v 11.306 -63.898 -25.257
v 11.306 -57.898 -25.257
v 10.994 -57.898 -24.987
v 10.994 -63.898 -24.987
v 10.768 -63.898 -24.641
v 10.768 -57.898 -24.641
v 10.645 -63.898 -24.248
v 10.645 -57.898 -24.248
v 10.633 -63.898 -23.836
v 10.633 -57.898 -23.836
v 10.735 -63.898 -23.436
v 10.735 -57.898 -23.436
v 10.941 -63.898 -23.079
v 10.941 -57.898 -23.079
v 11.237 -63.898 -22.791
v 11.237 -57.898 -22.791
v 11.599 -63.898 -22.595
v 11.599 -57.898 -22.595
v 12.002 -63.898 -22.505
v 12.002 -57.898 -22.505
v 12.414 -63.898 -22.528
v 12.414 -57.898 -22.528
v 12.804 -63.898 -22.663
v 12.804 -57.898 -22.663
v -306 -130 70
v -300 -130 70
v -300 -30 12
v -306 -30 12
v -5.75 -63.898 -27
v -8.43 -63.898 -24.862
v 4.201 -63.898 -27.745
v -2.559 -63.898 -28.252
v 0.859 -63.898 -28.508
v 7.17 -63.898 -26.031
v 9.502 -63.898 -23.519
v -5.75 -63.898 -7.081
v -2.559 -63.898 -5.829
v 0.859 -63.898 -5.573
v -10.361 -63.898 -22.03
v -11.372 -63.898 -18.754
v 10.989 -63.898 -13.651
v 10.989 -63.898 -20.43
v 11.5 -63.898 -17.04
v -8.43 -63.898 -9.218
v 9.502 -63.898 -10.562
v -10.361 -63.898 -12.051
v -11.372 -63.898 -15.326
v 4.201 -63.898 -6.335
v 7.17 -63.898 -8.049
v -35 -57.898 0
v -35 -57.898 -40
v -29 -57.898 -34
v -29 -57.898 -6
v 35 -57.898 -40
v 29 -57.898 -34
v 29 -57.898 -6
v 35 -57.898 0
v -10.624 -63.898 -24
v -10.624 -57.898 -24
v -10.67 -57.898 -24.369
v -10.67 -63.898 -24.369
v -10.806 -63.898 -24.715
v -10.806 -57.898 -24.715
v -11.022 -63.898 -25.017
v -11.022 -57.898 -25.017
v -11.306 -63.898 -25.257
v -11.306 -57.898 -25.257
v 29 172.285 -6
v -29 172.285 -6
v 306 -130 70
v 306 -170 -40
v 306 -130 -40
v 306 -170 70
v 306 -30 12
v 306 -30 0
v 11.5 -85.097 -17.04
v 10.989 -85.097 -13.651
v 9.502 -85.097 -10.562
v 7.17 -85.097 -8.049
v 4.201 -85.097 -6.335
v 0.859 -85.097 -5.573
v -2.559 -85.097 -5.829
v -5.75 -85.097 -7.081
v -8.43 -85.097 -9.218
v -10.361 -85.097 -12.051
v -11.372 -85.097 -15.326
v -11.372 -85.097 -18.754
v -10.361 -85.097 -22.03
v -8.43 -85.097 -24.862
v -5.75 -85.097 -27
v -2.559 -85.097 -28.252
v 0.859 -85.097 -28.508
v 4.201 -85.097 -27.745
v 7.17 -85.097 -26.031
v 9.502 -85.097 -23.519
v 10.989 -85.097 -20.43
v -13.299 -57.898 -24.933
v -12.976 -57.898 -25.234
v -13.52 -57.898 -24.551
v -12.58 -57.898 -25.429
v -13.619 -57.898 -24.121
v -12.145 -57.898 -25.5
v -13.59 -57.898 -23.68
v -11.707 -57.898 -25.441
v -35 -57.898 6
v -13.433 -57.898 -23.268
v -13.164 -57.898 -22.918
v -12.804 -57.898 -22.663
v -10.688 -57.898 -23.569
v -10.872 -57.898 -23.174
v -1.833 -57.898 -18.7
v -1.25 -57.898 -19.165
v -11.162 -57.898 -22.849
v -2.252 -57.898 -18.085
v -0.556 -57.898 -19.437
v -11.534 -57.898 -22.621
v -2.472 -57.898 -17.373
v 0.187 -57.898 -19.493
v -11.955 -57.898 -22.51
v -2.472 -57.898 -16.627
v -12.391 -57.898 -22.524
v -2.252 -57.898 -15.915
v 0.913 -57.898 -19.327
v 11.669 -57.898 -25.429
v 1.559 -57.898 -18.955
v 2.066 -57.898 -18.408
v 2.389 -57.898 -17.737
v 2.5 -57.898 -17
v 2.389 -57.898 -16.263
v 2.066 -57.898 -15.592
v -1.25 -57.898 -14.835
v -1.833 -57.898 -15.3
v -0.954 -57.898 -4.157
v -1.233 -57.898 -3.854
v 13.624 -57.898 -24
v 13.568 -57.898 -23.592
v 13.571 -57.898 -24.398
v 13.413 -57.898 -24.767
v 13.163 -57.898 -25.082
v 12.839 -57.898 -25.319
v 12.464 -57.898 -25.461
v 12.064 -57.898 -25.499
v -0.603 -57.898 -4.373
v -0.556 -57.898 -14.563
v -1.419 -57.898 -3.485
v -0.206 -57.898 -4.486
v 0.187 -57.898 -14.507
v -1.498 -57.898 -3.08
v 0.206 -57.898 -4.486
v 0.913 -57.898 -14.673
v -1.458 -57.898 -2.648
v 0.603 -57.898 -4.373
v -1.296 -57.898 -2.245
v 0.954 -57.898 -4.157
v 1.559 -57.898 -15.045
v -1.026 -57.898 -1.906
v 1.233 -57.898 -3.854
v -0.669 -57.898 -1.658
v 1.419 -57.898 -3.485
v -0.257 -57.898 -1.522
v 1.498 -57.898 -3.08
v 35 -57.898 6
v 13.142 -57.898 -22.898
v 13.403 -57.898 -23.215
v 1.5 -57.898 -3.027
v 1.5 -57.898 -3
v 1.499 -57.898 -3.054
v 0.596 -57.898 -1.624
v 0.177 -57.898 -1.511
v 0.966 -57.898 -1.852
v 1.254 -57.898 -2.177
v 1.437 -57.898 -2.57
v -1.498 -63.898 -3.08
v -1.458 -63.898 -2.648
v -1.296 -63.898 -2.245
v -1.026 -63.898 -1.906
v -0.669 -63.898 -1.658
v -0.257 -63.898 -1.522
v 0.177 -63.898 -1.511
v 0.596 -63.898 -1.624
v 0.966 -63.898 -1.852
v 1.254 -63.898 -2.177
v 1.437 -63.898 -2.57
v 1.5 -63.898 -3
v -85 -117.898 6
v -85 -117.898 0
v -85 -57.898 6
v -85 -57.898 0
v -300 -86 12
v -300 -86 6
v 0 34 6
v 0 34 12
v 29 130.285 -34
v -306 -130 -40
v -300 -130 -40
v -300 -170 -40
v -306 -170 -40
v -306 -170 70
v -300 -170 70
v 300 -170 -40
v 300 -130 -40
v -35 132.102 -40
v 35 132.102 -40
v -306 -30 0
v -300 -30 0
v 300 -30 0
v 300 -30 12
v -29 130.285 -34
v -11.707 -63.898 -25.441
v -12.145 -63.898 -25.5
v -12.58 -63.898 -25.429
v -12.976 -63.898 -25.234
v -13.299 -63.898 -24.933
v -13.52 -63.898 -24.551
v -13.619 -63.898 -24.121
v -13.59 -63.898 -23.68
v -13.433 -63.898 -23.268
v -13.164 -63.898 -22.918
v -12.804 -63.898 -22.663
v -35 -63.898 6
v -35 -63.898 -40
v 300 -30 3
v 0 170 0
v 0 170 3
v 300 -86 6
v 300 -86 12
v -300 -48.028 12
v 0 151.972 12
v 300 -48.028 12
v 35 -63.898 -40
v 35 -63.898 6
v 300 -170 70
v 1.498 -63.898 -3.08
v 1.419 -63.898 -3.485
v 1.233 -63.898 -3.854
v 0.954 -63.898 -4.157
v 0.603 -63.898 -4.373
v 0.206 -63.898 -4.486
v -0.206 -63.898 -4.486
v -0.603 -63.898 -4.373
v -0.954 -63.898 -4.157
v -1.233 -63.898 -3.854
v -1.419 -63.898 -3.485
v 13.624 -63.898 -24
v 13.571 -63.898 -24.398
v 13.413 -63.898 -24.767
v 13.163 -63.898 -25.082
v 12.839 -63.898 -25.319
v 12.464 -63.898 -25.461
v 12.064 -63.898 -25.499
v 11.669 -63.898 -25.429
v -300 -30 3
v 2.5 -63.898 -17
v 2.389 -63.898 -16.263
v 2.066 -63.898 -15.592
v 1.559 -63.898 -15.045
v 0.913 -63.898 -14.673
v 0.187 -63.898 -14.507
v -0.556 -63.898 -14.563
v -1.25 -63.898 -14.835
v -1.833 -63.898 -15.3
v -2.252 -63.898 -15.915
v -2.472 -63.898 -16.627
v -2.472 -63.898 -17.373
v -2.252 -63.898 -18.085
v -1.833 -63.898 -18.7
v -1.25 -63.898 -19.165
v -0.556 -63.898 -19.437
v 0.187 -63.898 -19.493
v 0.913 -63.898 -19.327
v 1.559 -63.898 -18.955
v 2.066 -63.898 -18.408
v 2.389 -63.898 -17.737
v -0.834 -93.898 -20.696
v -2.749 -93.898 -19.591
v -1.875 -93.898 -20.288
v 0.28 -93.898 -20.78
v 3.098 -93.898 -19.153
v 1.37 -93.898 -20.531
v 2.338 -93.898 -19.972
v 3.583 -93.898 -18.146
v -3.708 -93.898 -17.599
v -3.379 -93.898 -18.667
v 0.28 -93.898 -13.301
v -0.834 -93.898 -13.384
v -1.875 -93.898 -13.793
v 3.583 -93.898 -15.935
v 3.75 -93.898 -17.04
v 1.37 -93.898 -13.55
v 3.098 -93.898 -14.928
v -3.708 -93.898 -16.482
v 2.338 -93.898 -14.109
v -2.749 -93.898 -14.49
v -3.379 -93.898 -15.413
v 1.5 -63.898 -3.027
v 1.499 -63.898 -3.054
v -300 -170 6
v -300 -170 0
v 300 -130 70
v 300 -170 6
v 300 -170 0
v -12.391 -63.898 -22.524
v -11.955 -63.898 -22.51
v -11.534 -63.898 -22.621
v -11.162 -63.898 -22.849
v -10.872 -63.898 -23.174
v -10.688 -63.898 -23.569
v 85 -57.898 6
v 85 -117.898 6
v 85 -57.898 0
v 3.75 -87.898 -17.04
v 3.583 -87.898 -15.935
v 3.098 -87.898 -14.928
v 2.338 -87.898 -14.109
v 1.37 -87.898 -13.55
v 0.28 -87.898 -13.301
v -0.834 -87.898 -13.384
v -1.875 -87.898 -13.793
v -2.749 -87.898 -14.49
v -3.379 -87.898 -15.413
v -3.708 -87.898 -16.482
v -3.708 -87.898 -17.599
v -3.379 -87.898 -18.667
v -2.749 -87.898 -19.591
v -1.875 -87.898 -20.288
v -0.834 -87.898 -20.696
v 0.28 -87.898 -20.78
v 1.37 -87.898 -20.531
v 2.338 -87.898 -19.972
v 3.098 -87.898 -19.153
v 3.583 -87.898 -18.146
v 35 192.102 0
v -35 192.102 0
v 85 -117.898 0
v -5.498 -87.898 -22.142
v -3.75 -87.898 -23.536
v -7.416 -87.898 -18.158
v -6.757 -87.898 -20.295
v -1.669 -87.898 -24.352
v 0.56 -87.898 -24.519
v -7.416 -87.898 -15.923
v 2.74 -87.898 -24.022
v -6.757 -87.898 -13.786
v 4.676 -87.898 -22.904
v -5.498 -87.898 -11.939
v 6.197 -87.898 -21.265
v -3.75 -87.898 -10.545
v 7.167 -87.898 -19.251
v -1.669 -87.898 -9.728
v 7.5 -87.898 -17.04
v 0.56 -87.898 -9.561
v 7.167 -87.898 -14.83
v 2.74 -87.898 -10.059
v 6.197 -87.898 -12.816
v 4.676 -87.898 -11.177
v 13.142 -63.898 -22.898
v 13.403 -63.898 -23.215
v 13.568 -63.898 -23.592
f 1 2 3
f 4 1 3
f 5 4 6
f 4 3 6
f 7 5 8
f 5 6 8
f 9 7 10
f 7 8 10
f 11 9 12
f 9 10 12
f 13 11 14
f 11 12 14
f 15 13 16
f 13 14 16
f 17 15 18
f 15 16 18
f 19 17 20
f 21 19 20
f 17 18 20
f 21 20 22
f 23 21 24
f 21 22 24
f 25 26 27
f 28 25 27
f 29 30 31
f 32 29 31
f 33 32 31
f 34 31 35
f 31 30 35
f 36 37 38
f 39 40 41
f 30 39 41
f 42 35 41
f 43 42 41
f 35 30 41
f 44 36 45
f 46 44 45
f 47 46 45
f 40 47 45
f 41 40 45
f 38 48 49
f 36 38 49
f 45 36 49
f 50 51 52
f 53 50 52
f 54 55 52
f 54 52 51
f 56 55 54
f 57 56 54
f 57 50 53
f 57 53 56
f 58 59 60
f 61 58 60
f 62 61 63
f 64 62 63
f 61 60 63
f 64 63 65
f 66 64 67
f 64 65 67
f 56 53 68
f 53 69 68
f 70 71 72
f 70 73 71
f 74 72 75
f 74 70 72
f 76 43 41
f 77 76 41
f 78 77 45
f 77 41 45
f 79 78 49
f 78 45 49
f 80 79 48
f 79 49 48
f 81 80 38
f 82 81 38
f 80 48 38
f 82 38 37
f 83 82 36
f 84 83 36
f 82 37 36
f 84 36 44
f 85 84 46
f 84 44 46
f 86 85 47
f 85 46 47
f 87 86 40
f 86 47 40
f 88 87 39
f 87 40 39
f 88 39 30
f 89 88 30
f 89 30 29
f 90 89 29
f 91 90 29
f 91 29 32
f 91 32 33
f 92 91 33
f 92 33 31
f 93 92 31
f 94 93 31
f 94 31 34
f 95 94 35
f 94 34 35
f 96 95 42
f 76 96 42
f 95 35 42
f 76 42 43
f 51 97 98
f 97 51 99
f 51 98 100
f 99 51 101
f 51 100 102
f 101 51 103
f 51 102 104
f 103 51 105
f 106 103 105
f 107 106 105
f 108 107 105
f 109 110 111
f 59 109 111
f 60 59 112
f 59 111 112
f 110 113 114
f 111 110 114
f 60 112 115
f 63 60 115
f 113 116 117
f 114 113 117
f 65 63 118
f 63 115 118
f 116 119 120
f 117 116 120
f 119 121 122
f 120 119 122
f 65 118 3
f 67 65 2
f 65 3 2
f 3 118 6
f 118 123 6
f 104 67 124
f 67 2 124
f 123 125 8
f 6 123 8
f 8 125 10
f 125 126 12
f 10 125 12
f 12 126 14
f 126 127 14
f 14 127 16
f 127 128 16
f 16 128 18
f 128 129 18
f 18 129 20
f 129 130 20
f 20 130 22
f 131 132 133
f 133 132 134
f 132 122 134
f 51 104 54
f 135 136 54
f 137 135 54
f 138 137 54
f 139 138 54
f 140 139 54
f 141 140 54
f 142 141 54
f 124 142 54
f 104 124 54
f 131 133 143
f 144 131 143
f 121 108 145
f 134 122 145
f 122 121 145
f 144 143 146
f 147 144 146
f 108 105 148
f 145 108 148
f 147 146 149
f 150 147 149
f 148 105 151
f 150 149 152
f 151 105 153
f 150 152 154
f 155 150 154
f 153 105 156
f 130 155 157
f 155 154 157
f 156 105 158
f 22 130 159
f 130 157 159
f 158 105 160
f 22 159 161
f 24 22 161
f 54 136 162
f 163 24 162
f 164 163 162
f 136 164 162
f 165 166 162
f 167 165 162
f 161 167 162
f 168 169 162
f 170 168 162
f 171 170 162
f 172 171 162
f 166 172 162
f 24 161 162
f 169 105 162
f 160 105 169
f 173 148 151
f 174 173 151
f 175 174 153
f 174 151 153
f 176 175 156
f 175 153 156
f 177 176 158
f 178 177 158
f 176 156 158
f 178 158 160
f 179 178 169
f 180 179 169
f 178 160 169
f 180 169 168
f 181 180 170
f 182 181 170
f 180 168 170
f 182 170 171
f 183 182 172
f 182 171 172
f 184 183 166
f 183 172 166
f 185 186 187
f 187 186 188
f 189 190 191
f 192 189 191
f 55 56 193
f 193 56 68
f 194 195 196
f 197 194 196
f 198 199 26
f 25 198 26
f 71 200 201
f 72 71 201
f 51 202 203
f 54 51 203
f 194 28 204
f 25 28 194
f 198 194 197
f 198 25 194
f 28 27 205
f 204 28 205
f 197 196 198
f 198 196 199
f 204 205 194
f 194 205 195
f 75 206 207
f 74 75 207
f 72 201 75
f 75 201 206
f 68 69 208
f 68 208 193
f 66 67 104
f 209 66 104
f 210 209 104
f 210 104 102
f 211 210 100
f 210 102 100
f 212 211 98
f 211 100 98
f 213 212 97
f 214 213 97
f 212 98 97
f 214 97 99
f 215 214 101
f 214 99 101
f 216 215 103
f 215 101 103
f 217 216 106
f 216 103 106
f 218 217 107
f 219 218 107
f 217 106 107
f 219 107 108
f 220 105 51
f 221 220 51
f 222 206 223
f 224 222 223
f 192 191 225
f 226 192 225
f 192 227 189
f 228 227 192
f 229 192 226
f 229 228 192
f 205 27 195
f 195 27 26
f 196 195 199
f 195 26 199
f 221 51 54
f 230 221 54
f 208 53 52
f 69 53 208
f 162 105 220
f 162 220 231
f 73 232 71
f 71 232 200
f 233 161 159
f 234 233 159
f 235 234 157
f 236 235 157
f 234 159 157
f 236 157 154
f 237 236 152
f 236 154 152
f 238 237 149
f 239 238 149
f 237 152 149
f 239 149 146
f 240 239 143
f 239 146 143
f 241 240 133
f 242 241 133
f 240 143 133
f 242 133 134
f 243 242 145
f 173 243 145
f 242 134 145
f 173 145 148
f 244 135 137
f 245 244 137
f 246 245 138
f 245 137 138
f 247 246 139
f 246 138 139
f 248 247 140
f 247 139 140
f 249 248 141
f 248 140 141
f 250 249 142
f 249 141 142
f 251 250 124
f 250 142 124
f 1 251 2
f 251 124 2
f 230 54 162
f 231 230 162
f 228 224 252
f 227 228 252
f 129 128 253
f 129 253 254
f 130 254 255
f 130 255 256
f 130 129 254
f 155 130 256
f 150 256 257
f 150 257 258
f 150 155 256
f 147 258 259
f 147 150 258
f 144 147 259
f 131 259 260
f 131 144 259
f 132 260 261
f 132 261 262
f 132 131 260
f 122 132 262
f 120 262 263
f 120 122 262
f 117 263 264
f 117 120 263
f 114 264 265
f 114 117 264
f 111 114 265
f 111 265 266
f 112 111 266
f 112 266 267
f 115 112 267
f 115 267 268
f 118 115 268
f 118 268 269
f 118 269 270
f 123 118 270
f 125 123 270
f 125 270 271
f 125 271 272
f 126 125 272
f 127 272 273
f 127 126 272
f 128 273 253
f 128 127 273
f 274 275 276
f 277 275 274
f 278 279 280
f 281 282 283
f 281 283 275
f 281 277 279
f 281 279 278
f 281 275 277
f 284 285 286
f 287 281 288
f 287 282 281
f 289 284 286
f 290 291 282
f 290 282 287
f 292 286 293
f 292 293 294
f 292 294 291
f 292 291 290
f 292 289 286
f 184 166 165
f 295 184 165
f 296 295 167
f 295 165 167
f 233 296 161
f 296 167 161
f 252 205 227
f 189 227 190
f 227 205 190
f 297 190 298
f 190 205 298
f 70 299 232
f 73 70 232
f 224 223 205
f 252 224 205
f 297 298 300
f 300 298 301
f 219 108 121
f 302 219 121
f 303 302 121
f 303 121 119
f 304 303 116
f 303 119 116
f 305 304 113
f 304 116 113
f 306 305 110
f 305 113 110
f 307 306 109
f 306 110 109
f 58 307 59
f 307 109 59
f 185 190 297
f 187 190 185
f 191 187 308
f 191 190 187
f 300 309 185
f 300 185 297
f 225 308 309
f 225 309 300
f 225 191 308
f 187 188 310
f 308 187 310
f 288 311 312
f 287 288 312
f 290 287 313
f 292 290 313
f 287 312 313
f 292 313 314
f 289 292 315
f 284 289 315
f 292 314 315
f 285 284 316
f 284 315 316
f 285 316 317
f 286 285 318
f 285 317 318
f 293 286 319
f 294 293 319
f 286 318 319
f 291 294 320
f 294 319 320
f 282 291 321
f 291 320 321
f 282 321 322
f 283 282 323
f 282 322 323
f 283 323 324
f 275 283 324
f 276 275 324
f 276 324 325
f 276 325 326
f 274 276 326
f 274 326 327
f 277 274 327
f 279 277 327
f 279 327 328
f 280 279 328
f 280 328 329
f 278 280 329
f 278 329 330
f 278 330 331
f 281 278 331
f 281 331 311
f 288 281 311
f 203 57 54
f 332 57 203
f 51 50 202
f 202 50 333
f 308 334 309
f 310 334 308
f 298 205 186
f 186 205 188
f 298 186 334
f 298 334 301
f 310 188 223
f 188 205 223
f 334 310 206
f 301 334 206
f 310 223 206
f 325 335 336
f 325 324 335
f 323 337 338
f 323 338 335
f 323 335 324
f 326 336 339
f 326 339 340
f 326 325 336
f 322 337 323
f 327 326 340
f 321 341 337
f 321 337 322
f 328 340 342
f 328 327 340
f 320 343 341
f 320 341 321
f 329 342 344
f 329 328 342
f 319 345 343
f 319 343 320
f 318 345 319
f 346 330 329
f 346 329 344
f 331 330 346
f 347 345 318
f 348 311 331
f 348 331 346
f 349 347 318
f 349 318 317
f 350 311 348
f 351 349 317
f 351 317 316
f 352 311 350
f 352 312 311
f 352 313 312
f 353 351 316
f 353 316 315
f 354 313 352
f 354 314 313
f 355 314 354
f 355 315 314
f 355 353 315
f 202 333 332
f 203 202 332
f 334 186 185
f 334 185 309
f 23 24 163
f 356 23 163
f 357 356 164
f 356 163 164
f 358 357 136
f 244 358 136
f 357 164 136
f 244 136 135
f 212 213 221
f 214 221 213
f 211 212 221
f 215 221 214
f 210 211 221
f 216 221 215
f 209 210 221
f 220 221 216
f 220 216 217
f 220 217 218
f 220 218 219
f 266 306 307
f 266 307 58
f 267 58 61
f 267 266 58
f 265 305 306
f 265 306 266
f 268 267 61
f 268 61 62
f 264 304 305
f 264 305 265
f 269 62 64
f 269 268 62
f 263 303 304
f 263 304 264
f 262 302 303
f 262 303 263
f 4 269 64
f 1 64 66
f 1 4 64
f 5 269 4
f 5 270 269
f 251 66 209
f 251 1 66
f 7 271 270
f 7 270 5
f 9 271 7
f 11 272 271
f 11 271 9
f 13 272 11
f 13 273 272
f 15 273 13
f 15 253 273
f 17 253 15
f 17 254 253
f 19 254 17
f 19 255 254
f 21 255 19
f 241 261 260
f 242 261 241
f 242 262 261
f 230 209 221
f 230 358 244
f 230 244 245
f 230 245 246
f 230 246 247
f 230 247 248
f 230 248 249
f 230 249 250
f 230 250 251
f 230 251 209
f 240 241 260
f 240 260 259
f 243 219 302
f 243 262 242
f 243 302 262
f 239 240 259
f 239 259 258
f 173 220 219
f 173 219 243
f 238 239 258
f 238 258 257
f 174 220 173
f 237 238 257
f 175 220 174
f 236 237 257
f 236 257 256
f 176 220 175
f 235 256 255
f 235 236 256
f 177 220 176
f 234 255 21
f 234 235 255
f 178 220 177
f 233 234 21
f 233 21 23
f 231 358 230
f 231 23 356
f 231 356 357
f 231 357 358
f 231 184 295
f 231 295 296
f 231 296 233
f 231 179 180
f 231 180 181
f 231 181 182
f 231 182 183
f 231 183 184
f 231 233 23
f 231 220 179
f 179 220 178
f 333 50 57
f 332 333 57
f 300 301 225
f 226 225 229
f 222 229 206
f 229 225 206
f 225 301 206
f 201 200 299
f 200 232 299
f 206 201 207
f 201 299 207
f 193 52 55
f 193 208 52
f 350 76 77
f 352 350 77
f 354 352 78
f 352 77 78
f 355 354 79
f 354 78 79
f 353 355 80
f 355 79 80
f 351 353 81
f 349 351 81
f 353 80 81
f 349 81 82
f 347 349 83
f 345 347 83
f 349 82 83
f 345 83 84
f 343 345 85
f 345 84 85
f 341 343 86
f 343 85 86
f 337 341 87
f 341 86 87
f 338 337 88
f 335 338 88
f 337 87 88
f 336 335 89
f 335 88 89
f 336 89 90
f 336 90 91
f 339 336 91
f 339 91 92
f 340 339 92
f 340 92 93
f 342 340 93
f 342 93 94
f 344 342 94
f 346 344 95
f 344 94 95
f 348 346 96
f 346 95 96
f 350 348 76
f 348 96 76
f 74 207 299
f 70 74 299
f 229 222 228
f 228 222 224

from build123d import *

# Parameters (mm, degrees)
F0_W      = 170
F0_H      = 60
F0_W_2    = 300
F0_H_2    = 40
F1_DEPTH  = 6
F2_DEPTH  = 12
F3_SIZE2  = 9
F3_SIZE   = 15
F4_W      = 70
F4_H      = 250
F5_DEPTH  = 40
F6_SIZE2  = 39.99999
F6_SIZE   = 59.99999
F8_DEPTH  = 6
F10_DEPTH = 6
F11_W     = 70
F11_H     = 40
F11_H_2   = 6
F11_R     = 2.5
F12_DEPTH = 6
F13_R     = 11.5
F13_R_2   = 3.75
F14_DEPTH = 24
F15_SIZE2 = 2.8008301528
F15_SIZE  = 4
F13_R_3   = 2.5
F16_DEPTH = 30
F17_T     = -6


# Not quite as in the source:
# - a fillet or chamfer is up to 0.001 mm smaller than in the source, because OpenCascade refuses the exact size
# - a feature names something its author has since deleted; it is built from what else it names


with BuildPart() as f1:
    # F0 (on Top) → F1 (new body)
    with BuildSketch(Plane.XY):
        Polygon((-300, -86), (-300, -130), (0, -130), (300, -130), (300, -86), (0, 34), align=None)
        with Locations((0, -87.89823)):
            Rectangle(F0_W, F0_H, mode=Mode.SUBTRACT)
        with Locations((-150, -150)):
            Rectangle(F0_W_2, F0_H_2)
        with Locations((150, -150)):
            Rectangle(F0_W_2, F0_H_2)
    extrude(amount=F1_DEPTH)

    # F0 (on Top) → F2 (join)
    with BuildSketch(Plane.XY):
        Polygon((-300, -30), (-300, -86), (0, 34), (300, -86), (300, -30), (0, 170), align=None)
    extrude(amount=F2_DEPTH)

    # F3
    f3_edges = [f1.edges().sort_by_distance(p)[0] for p in [
        (-150, 70, 12),
        (150, 70, 12),
    ]]
    f3_side = f1.faces().sort_by_distance((-293.476688, -58, 12))[0]
    chamfer(f3_edges, length=F3_SIZE, length2=F3_SIZE2, reference=f3_side)


with BuildPart() as f5:
    # F4 (on face) → F5 (new body)
    with BuildSketch(Plane.XY):
        with Locations((0, 67.10177)):
            Rectangle(F4_W, F4_H)
    extrude(amount=-F5_DEPTH)

    # F6 (size 60 and 40 in the source; OpenCascade refuses exactly that, so slightly less here)
    f6_edges = [f5.edges().sort_by_distance(p)[0] for p in [
        (0, 192.10177, -40),
    ]]
    f6_side = f5.faces().sort_by_distance((0, 67.10177, -40))[0]
    chamfer(f6_edges, length=F6_SIZE, length2=F6_SIZE2, reference=f6_side)

    # F17
    f17_openings = [f5.faces().sort_by_distance(p)[0] for p in [
        (0, -57.89823, -20),
    ]]
    offset(amount=F17_T, openings=f17_openings)


with BuildPart() as f8:
    # F7 (on face) → F8 (new body)
    with BuildSketch(Plane.YZ.offset(300)):
        Polygon((-30, 0), (-170, 0), (-170, -40), (-130, -40), align=None)
        Polygon((-130, 70), (-170, 70), (-170, 6), (-86, 6), (-86, 12), (-48.0277563773, 12), (-30, 3), (-30, 12), align=None)
        Polygon((-86, 6), (-170, 6), (-170, 0), (-30, 0), (-30, 3), (-48.0277563773, 12), (-86, 12), align=None)
    extrude(amount=F8_DEPTH)


with BuildPart() as f10:
    # F9 (on face) → F10 (new body)
    with BuildSketch(Plane(origin=(-300, 0, 0), x_dir=(0, -1, 0), z_dir=(-1, 0, 0))):
        Polygon((170, -40), (170, 0), (30, 0), (130, -40), align=None)
        Polygon((86, 6), (170, 6), (170, 70), (130, 70), (30, 12), (30, 3), (48.0277563773, 12), (86, 12), align=None)
        Polygon((30, 0), (170, 0), (170, 6), (86, 6), (86, 12), (48.0277563773, 12), (30, 3), align=None)
    extrude(amount=F10_DEPTH)


with BuildPart() as f12:
    # F11 (on face) → F12 (new body)
    with BuildSketch(Plane.XZ.offset(57.89823)):
        with Locations((0, -20)):
            Rectangle(F11_W, F11_H)
        with BuildLine():
            ThreePointArc((1.49784603, -3.0803571429), (10.4156095458, -7.645050626), (14, -17))
            ThreePointArc((14, -17), (13.6976571495, -19.8938190361), (12.8036873409, -22.6626487156))
            ThreePointArc((12.8036873409, -22.6626487156), (13.4028308252, -23.2154611329), (13.624355653, -24))
            ThreePointArc((13.624355653, -24), (12.8392781966, -25.3186681753), (11.3058413109, -25.2569941415))
            ThreePointArc((11.3058413109, -25.2569941415), (0, -31), (-11.3058413109, -25.2569941415))
            ThreePointArc((-11.3058413109, -25.2569941415), (-13.4233937587, -24.75), (-12.8036873409, -22.6626487156))
            ThreePointArc((-12.8036873409, -22.6626487156), (-12.124355653, -10), (-1.49784603, -3.0803571429))
            ThreePointArc((-1.49784603, -3.0803571429), (-0.0401930031, -1.5005385892), (1.5, -3))
            ThreePointArc((1.5, -3), (1.4994614108, -3.0401930031), (1.49784603, -3.0803571429))
        make_face(mode=Mode.SUBTRACT)
        with Locations((0, 3)):
            Rectangle(F11_W, F11_H_2)
        with BuildLine():
            ThreePointArc((12.8036873409, -22.6626487156), (13.6976571495, -19.8938190361), (14, -17))
            ThreePointArc((14, -17), (10.4156095458, -7.645050626), (1.49784603, -3.0803571429))
            ThreePointArc((1.49784603, -3.0803571429), (0, -4.5), (-1.49784603, -3.0803571429))
            ThreePointArc((-1.49784603, -3.0803571429), (-12.124355653, -10), (-12.8036873409, -22.6626487156))
            ThreePointArc((-12.8036873409, -22.6626487156), (-11.3398167858, -22.7215248278), (-10.624355653, -24))
            ThreePointArc((-10.624355653, -24), (-10.8056874777, -24.7149225437), (-11.3058413109, -25.2569941415))
            ThreePointArc((-11.3058413109, -25.2569941415), (0, -31), (11.3058413109, -25.2569941415))
            ThreePointArc((11.3058413109, -25.2569941415), (10.8253175473, -23.25), (12.8036873409, -22.6626487156))
        make_face()
        with Locations((0, -17)):
            Circle(F11_R, mode=Mode.SUBTRACT)
    extrude(amount=F12_DEPTH)


with BuildPart() as f14:
    # F13 (on face) → F14 (new body)
    with BuildSketch(Plane.XZ.offset(63.89823)):
        with Locations((0, -17.040412873)):
            Circle(F13_R)
        with Locations((0, -17.040412873)):
            Circle(F13_R_2, mode=Mode.SUBTRACT)
    extrude(amount=F14_DEPTH)

    # F15
    f15_edges = [f14.edges().sort_by_distance(p)[0] for p in [
        (-11.5, -87.89823, -17.040413),
    ]]
    f15_side = f14.faces().sort_by_distance((-11.174731, -87.89823, -17.040413))[0]
    chamfer(f15_edges, length=F15_SIZE, length2=F15_SIZE2, reference=f15_side)

    # F13 (on face) → F16 (join)
    with BuildSketch(Plane.XZ.offset(63.89823)):
        with Locations((0, -17.040412873)):
            Circle(F13_R_2)
        with Locations((0, -17)):
            Circle(F13_R_3, mode=Mode.SUBTRACT)
        with Locations((0, -17)):
            Circle(F13_R_3)
    extrude(amount=F16_DEPTH)


solid = Compound([f1.part, f5.part, f8.part, f10.part, f12.part, f14.part])
